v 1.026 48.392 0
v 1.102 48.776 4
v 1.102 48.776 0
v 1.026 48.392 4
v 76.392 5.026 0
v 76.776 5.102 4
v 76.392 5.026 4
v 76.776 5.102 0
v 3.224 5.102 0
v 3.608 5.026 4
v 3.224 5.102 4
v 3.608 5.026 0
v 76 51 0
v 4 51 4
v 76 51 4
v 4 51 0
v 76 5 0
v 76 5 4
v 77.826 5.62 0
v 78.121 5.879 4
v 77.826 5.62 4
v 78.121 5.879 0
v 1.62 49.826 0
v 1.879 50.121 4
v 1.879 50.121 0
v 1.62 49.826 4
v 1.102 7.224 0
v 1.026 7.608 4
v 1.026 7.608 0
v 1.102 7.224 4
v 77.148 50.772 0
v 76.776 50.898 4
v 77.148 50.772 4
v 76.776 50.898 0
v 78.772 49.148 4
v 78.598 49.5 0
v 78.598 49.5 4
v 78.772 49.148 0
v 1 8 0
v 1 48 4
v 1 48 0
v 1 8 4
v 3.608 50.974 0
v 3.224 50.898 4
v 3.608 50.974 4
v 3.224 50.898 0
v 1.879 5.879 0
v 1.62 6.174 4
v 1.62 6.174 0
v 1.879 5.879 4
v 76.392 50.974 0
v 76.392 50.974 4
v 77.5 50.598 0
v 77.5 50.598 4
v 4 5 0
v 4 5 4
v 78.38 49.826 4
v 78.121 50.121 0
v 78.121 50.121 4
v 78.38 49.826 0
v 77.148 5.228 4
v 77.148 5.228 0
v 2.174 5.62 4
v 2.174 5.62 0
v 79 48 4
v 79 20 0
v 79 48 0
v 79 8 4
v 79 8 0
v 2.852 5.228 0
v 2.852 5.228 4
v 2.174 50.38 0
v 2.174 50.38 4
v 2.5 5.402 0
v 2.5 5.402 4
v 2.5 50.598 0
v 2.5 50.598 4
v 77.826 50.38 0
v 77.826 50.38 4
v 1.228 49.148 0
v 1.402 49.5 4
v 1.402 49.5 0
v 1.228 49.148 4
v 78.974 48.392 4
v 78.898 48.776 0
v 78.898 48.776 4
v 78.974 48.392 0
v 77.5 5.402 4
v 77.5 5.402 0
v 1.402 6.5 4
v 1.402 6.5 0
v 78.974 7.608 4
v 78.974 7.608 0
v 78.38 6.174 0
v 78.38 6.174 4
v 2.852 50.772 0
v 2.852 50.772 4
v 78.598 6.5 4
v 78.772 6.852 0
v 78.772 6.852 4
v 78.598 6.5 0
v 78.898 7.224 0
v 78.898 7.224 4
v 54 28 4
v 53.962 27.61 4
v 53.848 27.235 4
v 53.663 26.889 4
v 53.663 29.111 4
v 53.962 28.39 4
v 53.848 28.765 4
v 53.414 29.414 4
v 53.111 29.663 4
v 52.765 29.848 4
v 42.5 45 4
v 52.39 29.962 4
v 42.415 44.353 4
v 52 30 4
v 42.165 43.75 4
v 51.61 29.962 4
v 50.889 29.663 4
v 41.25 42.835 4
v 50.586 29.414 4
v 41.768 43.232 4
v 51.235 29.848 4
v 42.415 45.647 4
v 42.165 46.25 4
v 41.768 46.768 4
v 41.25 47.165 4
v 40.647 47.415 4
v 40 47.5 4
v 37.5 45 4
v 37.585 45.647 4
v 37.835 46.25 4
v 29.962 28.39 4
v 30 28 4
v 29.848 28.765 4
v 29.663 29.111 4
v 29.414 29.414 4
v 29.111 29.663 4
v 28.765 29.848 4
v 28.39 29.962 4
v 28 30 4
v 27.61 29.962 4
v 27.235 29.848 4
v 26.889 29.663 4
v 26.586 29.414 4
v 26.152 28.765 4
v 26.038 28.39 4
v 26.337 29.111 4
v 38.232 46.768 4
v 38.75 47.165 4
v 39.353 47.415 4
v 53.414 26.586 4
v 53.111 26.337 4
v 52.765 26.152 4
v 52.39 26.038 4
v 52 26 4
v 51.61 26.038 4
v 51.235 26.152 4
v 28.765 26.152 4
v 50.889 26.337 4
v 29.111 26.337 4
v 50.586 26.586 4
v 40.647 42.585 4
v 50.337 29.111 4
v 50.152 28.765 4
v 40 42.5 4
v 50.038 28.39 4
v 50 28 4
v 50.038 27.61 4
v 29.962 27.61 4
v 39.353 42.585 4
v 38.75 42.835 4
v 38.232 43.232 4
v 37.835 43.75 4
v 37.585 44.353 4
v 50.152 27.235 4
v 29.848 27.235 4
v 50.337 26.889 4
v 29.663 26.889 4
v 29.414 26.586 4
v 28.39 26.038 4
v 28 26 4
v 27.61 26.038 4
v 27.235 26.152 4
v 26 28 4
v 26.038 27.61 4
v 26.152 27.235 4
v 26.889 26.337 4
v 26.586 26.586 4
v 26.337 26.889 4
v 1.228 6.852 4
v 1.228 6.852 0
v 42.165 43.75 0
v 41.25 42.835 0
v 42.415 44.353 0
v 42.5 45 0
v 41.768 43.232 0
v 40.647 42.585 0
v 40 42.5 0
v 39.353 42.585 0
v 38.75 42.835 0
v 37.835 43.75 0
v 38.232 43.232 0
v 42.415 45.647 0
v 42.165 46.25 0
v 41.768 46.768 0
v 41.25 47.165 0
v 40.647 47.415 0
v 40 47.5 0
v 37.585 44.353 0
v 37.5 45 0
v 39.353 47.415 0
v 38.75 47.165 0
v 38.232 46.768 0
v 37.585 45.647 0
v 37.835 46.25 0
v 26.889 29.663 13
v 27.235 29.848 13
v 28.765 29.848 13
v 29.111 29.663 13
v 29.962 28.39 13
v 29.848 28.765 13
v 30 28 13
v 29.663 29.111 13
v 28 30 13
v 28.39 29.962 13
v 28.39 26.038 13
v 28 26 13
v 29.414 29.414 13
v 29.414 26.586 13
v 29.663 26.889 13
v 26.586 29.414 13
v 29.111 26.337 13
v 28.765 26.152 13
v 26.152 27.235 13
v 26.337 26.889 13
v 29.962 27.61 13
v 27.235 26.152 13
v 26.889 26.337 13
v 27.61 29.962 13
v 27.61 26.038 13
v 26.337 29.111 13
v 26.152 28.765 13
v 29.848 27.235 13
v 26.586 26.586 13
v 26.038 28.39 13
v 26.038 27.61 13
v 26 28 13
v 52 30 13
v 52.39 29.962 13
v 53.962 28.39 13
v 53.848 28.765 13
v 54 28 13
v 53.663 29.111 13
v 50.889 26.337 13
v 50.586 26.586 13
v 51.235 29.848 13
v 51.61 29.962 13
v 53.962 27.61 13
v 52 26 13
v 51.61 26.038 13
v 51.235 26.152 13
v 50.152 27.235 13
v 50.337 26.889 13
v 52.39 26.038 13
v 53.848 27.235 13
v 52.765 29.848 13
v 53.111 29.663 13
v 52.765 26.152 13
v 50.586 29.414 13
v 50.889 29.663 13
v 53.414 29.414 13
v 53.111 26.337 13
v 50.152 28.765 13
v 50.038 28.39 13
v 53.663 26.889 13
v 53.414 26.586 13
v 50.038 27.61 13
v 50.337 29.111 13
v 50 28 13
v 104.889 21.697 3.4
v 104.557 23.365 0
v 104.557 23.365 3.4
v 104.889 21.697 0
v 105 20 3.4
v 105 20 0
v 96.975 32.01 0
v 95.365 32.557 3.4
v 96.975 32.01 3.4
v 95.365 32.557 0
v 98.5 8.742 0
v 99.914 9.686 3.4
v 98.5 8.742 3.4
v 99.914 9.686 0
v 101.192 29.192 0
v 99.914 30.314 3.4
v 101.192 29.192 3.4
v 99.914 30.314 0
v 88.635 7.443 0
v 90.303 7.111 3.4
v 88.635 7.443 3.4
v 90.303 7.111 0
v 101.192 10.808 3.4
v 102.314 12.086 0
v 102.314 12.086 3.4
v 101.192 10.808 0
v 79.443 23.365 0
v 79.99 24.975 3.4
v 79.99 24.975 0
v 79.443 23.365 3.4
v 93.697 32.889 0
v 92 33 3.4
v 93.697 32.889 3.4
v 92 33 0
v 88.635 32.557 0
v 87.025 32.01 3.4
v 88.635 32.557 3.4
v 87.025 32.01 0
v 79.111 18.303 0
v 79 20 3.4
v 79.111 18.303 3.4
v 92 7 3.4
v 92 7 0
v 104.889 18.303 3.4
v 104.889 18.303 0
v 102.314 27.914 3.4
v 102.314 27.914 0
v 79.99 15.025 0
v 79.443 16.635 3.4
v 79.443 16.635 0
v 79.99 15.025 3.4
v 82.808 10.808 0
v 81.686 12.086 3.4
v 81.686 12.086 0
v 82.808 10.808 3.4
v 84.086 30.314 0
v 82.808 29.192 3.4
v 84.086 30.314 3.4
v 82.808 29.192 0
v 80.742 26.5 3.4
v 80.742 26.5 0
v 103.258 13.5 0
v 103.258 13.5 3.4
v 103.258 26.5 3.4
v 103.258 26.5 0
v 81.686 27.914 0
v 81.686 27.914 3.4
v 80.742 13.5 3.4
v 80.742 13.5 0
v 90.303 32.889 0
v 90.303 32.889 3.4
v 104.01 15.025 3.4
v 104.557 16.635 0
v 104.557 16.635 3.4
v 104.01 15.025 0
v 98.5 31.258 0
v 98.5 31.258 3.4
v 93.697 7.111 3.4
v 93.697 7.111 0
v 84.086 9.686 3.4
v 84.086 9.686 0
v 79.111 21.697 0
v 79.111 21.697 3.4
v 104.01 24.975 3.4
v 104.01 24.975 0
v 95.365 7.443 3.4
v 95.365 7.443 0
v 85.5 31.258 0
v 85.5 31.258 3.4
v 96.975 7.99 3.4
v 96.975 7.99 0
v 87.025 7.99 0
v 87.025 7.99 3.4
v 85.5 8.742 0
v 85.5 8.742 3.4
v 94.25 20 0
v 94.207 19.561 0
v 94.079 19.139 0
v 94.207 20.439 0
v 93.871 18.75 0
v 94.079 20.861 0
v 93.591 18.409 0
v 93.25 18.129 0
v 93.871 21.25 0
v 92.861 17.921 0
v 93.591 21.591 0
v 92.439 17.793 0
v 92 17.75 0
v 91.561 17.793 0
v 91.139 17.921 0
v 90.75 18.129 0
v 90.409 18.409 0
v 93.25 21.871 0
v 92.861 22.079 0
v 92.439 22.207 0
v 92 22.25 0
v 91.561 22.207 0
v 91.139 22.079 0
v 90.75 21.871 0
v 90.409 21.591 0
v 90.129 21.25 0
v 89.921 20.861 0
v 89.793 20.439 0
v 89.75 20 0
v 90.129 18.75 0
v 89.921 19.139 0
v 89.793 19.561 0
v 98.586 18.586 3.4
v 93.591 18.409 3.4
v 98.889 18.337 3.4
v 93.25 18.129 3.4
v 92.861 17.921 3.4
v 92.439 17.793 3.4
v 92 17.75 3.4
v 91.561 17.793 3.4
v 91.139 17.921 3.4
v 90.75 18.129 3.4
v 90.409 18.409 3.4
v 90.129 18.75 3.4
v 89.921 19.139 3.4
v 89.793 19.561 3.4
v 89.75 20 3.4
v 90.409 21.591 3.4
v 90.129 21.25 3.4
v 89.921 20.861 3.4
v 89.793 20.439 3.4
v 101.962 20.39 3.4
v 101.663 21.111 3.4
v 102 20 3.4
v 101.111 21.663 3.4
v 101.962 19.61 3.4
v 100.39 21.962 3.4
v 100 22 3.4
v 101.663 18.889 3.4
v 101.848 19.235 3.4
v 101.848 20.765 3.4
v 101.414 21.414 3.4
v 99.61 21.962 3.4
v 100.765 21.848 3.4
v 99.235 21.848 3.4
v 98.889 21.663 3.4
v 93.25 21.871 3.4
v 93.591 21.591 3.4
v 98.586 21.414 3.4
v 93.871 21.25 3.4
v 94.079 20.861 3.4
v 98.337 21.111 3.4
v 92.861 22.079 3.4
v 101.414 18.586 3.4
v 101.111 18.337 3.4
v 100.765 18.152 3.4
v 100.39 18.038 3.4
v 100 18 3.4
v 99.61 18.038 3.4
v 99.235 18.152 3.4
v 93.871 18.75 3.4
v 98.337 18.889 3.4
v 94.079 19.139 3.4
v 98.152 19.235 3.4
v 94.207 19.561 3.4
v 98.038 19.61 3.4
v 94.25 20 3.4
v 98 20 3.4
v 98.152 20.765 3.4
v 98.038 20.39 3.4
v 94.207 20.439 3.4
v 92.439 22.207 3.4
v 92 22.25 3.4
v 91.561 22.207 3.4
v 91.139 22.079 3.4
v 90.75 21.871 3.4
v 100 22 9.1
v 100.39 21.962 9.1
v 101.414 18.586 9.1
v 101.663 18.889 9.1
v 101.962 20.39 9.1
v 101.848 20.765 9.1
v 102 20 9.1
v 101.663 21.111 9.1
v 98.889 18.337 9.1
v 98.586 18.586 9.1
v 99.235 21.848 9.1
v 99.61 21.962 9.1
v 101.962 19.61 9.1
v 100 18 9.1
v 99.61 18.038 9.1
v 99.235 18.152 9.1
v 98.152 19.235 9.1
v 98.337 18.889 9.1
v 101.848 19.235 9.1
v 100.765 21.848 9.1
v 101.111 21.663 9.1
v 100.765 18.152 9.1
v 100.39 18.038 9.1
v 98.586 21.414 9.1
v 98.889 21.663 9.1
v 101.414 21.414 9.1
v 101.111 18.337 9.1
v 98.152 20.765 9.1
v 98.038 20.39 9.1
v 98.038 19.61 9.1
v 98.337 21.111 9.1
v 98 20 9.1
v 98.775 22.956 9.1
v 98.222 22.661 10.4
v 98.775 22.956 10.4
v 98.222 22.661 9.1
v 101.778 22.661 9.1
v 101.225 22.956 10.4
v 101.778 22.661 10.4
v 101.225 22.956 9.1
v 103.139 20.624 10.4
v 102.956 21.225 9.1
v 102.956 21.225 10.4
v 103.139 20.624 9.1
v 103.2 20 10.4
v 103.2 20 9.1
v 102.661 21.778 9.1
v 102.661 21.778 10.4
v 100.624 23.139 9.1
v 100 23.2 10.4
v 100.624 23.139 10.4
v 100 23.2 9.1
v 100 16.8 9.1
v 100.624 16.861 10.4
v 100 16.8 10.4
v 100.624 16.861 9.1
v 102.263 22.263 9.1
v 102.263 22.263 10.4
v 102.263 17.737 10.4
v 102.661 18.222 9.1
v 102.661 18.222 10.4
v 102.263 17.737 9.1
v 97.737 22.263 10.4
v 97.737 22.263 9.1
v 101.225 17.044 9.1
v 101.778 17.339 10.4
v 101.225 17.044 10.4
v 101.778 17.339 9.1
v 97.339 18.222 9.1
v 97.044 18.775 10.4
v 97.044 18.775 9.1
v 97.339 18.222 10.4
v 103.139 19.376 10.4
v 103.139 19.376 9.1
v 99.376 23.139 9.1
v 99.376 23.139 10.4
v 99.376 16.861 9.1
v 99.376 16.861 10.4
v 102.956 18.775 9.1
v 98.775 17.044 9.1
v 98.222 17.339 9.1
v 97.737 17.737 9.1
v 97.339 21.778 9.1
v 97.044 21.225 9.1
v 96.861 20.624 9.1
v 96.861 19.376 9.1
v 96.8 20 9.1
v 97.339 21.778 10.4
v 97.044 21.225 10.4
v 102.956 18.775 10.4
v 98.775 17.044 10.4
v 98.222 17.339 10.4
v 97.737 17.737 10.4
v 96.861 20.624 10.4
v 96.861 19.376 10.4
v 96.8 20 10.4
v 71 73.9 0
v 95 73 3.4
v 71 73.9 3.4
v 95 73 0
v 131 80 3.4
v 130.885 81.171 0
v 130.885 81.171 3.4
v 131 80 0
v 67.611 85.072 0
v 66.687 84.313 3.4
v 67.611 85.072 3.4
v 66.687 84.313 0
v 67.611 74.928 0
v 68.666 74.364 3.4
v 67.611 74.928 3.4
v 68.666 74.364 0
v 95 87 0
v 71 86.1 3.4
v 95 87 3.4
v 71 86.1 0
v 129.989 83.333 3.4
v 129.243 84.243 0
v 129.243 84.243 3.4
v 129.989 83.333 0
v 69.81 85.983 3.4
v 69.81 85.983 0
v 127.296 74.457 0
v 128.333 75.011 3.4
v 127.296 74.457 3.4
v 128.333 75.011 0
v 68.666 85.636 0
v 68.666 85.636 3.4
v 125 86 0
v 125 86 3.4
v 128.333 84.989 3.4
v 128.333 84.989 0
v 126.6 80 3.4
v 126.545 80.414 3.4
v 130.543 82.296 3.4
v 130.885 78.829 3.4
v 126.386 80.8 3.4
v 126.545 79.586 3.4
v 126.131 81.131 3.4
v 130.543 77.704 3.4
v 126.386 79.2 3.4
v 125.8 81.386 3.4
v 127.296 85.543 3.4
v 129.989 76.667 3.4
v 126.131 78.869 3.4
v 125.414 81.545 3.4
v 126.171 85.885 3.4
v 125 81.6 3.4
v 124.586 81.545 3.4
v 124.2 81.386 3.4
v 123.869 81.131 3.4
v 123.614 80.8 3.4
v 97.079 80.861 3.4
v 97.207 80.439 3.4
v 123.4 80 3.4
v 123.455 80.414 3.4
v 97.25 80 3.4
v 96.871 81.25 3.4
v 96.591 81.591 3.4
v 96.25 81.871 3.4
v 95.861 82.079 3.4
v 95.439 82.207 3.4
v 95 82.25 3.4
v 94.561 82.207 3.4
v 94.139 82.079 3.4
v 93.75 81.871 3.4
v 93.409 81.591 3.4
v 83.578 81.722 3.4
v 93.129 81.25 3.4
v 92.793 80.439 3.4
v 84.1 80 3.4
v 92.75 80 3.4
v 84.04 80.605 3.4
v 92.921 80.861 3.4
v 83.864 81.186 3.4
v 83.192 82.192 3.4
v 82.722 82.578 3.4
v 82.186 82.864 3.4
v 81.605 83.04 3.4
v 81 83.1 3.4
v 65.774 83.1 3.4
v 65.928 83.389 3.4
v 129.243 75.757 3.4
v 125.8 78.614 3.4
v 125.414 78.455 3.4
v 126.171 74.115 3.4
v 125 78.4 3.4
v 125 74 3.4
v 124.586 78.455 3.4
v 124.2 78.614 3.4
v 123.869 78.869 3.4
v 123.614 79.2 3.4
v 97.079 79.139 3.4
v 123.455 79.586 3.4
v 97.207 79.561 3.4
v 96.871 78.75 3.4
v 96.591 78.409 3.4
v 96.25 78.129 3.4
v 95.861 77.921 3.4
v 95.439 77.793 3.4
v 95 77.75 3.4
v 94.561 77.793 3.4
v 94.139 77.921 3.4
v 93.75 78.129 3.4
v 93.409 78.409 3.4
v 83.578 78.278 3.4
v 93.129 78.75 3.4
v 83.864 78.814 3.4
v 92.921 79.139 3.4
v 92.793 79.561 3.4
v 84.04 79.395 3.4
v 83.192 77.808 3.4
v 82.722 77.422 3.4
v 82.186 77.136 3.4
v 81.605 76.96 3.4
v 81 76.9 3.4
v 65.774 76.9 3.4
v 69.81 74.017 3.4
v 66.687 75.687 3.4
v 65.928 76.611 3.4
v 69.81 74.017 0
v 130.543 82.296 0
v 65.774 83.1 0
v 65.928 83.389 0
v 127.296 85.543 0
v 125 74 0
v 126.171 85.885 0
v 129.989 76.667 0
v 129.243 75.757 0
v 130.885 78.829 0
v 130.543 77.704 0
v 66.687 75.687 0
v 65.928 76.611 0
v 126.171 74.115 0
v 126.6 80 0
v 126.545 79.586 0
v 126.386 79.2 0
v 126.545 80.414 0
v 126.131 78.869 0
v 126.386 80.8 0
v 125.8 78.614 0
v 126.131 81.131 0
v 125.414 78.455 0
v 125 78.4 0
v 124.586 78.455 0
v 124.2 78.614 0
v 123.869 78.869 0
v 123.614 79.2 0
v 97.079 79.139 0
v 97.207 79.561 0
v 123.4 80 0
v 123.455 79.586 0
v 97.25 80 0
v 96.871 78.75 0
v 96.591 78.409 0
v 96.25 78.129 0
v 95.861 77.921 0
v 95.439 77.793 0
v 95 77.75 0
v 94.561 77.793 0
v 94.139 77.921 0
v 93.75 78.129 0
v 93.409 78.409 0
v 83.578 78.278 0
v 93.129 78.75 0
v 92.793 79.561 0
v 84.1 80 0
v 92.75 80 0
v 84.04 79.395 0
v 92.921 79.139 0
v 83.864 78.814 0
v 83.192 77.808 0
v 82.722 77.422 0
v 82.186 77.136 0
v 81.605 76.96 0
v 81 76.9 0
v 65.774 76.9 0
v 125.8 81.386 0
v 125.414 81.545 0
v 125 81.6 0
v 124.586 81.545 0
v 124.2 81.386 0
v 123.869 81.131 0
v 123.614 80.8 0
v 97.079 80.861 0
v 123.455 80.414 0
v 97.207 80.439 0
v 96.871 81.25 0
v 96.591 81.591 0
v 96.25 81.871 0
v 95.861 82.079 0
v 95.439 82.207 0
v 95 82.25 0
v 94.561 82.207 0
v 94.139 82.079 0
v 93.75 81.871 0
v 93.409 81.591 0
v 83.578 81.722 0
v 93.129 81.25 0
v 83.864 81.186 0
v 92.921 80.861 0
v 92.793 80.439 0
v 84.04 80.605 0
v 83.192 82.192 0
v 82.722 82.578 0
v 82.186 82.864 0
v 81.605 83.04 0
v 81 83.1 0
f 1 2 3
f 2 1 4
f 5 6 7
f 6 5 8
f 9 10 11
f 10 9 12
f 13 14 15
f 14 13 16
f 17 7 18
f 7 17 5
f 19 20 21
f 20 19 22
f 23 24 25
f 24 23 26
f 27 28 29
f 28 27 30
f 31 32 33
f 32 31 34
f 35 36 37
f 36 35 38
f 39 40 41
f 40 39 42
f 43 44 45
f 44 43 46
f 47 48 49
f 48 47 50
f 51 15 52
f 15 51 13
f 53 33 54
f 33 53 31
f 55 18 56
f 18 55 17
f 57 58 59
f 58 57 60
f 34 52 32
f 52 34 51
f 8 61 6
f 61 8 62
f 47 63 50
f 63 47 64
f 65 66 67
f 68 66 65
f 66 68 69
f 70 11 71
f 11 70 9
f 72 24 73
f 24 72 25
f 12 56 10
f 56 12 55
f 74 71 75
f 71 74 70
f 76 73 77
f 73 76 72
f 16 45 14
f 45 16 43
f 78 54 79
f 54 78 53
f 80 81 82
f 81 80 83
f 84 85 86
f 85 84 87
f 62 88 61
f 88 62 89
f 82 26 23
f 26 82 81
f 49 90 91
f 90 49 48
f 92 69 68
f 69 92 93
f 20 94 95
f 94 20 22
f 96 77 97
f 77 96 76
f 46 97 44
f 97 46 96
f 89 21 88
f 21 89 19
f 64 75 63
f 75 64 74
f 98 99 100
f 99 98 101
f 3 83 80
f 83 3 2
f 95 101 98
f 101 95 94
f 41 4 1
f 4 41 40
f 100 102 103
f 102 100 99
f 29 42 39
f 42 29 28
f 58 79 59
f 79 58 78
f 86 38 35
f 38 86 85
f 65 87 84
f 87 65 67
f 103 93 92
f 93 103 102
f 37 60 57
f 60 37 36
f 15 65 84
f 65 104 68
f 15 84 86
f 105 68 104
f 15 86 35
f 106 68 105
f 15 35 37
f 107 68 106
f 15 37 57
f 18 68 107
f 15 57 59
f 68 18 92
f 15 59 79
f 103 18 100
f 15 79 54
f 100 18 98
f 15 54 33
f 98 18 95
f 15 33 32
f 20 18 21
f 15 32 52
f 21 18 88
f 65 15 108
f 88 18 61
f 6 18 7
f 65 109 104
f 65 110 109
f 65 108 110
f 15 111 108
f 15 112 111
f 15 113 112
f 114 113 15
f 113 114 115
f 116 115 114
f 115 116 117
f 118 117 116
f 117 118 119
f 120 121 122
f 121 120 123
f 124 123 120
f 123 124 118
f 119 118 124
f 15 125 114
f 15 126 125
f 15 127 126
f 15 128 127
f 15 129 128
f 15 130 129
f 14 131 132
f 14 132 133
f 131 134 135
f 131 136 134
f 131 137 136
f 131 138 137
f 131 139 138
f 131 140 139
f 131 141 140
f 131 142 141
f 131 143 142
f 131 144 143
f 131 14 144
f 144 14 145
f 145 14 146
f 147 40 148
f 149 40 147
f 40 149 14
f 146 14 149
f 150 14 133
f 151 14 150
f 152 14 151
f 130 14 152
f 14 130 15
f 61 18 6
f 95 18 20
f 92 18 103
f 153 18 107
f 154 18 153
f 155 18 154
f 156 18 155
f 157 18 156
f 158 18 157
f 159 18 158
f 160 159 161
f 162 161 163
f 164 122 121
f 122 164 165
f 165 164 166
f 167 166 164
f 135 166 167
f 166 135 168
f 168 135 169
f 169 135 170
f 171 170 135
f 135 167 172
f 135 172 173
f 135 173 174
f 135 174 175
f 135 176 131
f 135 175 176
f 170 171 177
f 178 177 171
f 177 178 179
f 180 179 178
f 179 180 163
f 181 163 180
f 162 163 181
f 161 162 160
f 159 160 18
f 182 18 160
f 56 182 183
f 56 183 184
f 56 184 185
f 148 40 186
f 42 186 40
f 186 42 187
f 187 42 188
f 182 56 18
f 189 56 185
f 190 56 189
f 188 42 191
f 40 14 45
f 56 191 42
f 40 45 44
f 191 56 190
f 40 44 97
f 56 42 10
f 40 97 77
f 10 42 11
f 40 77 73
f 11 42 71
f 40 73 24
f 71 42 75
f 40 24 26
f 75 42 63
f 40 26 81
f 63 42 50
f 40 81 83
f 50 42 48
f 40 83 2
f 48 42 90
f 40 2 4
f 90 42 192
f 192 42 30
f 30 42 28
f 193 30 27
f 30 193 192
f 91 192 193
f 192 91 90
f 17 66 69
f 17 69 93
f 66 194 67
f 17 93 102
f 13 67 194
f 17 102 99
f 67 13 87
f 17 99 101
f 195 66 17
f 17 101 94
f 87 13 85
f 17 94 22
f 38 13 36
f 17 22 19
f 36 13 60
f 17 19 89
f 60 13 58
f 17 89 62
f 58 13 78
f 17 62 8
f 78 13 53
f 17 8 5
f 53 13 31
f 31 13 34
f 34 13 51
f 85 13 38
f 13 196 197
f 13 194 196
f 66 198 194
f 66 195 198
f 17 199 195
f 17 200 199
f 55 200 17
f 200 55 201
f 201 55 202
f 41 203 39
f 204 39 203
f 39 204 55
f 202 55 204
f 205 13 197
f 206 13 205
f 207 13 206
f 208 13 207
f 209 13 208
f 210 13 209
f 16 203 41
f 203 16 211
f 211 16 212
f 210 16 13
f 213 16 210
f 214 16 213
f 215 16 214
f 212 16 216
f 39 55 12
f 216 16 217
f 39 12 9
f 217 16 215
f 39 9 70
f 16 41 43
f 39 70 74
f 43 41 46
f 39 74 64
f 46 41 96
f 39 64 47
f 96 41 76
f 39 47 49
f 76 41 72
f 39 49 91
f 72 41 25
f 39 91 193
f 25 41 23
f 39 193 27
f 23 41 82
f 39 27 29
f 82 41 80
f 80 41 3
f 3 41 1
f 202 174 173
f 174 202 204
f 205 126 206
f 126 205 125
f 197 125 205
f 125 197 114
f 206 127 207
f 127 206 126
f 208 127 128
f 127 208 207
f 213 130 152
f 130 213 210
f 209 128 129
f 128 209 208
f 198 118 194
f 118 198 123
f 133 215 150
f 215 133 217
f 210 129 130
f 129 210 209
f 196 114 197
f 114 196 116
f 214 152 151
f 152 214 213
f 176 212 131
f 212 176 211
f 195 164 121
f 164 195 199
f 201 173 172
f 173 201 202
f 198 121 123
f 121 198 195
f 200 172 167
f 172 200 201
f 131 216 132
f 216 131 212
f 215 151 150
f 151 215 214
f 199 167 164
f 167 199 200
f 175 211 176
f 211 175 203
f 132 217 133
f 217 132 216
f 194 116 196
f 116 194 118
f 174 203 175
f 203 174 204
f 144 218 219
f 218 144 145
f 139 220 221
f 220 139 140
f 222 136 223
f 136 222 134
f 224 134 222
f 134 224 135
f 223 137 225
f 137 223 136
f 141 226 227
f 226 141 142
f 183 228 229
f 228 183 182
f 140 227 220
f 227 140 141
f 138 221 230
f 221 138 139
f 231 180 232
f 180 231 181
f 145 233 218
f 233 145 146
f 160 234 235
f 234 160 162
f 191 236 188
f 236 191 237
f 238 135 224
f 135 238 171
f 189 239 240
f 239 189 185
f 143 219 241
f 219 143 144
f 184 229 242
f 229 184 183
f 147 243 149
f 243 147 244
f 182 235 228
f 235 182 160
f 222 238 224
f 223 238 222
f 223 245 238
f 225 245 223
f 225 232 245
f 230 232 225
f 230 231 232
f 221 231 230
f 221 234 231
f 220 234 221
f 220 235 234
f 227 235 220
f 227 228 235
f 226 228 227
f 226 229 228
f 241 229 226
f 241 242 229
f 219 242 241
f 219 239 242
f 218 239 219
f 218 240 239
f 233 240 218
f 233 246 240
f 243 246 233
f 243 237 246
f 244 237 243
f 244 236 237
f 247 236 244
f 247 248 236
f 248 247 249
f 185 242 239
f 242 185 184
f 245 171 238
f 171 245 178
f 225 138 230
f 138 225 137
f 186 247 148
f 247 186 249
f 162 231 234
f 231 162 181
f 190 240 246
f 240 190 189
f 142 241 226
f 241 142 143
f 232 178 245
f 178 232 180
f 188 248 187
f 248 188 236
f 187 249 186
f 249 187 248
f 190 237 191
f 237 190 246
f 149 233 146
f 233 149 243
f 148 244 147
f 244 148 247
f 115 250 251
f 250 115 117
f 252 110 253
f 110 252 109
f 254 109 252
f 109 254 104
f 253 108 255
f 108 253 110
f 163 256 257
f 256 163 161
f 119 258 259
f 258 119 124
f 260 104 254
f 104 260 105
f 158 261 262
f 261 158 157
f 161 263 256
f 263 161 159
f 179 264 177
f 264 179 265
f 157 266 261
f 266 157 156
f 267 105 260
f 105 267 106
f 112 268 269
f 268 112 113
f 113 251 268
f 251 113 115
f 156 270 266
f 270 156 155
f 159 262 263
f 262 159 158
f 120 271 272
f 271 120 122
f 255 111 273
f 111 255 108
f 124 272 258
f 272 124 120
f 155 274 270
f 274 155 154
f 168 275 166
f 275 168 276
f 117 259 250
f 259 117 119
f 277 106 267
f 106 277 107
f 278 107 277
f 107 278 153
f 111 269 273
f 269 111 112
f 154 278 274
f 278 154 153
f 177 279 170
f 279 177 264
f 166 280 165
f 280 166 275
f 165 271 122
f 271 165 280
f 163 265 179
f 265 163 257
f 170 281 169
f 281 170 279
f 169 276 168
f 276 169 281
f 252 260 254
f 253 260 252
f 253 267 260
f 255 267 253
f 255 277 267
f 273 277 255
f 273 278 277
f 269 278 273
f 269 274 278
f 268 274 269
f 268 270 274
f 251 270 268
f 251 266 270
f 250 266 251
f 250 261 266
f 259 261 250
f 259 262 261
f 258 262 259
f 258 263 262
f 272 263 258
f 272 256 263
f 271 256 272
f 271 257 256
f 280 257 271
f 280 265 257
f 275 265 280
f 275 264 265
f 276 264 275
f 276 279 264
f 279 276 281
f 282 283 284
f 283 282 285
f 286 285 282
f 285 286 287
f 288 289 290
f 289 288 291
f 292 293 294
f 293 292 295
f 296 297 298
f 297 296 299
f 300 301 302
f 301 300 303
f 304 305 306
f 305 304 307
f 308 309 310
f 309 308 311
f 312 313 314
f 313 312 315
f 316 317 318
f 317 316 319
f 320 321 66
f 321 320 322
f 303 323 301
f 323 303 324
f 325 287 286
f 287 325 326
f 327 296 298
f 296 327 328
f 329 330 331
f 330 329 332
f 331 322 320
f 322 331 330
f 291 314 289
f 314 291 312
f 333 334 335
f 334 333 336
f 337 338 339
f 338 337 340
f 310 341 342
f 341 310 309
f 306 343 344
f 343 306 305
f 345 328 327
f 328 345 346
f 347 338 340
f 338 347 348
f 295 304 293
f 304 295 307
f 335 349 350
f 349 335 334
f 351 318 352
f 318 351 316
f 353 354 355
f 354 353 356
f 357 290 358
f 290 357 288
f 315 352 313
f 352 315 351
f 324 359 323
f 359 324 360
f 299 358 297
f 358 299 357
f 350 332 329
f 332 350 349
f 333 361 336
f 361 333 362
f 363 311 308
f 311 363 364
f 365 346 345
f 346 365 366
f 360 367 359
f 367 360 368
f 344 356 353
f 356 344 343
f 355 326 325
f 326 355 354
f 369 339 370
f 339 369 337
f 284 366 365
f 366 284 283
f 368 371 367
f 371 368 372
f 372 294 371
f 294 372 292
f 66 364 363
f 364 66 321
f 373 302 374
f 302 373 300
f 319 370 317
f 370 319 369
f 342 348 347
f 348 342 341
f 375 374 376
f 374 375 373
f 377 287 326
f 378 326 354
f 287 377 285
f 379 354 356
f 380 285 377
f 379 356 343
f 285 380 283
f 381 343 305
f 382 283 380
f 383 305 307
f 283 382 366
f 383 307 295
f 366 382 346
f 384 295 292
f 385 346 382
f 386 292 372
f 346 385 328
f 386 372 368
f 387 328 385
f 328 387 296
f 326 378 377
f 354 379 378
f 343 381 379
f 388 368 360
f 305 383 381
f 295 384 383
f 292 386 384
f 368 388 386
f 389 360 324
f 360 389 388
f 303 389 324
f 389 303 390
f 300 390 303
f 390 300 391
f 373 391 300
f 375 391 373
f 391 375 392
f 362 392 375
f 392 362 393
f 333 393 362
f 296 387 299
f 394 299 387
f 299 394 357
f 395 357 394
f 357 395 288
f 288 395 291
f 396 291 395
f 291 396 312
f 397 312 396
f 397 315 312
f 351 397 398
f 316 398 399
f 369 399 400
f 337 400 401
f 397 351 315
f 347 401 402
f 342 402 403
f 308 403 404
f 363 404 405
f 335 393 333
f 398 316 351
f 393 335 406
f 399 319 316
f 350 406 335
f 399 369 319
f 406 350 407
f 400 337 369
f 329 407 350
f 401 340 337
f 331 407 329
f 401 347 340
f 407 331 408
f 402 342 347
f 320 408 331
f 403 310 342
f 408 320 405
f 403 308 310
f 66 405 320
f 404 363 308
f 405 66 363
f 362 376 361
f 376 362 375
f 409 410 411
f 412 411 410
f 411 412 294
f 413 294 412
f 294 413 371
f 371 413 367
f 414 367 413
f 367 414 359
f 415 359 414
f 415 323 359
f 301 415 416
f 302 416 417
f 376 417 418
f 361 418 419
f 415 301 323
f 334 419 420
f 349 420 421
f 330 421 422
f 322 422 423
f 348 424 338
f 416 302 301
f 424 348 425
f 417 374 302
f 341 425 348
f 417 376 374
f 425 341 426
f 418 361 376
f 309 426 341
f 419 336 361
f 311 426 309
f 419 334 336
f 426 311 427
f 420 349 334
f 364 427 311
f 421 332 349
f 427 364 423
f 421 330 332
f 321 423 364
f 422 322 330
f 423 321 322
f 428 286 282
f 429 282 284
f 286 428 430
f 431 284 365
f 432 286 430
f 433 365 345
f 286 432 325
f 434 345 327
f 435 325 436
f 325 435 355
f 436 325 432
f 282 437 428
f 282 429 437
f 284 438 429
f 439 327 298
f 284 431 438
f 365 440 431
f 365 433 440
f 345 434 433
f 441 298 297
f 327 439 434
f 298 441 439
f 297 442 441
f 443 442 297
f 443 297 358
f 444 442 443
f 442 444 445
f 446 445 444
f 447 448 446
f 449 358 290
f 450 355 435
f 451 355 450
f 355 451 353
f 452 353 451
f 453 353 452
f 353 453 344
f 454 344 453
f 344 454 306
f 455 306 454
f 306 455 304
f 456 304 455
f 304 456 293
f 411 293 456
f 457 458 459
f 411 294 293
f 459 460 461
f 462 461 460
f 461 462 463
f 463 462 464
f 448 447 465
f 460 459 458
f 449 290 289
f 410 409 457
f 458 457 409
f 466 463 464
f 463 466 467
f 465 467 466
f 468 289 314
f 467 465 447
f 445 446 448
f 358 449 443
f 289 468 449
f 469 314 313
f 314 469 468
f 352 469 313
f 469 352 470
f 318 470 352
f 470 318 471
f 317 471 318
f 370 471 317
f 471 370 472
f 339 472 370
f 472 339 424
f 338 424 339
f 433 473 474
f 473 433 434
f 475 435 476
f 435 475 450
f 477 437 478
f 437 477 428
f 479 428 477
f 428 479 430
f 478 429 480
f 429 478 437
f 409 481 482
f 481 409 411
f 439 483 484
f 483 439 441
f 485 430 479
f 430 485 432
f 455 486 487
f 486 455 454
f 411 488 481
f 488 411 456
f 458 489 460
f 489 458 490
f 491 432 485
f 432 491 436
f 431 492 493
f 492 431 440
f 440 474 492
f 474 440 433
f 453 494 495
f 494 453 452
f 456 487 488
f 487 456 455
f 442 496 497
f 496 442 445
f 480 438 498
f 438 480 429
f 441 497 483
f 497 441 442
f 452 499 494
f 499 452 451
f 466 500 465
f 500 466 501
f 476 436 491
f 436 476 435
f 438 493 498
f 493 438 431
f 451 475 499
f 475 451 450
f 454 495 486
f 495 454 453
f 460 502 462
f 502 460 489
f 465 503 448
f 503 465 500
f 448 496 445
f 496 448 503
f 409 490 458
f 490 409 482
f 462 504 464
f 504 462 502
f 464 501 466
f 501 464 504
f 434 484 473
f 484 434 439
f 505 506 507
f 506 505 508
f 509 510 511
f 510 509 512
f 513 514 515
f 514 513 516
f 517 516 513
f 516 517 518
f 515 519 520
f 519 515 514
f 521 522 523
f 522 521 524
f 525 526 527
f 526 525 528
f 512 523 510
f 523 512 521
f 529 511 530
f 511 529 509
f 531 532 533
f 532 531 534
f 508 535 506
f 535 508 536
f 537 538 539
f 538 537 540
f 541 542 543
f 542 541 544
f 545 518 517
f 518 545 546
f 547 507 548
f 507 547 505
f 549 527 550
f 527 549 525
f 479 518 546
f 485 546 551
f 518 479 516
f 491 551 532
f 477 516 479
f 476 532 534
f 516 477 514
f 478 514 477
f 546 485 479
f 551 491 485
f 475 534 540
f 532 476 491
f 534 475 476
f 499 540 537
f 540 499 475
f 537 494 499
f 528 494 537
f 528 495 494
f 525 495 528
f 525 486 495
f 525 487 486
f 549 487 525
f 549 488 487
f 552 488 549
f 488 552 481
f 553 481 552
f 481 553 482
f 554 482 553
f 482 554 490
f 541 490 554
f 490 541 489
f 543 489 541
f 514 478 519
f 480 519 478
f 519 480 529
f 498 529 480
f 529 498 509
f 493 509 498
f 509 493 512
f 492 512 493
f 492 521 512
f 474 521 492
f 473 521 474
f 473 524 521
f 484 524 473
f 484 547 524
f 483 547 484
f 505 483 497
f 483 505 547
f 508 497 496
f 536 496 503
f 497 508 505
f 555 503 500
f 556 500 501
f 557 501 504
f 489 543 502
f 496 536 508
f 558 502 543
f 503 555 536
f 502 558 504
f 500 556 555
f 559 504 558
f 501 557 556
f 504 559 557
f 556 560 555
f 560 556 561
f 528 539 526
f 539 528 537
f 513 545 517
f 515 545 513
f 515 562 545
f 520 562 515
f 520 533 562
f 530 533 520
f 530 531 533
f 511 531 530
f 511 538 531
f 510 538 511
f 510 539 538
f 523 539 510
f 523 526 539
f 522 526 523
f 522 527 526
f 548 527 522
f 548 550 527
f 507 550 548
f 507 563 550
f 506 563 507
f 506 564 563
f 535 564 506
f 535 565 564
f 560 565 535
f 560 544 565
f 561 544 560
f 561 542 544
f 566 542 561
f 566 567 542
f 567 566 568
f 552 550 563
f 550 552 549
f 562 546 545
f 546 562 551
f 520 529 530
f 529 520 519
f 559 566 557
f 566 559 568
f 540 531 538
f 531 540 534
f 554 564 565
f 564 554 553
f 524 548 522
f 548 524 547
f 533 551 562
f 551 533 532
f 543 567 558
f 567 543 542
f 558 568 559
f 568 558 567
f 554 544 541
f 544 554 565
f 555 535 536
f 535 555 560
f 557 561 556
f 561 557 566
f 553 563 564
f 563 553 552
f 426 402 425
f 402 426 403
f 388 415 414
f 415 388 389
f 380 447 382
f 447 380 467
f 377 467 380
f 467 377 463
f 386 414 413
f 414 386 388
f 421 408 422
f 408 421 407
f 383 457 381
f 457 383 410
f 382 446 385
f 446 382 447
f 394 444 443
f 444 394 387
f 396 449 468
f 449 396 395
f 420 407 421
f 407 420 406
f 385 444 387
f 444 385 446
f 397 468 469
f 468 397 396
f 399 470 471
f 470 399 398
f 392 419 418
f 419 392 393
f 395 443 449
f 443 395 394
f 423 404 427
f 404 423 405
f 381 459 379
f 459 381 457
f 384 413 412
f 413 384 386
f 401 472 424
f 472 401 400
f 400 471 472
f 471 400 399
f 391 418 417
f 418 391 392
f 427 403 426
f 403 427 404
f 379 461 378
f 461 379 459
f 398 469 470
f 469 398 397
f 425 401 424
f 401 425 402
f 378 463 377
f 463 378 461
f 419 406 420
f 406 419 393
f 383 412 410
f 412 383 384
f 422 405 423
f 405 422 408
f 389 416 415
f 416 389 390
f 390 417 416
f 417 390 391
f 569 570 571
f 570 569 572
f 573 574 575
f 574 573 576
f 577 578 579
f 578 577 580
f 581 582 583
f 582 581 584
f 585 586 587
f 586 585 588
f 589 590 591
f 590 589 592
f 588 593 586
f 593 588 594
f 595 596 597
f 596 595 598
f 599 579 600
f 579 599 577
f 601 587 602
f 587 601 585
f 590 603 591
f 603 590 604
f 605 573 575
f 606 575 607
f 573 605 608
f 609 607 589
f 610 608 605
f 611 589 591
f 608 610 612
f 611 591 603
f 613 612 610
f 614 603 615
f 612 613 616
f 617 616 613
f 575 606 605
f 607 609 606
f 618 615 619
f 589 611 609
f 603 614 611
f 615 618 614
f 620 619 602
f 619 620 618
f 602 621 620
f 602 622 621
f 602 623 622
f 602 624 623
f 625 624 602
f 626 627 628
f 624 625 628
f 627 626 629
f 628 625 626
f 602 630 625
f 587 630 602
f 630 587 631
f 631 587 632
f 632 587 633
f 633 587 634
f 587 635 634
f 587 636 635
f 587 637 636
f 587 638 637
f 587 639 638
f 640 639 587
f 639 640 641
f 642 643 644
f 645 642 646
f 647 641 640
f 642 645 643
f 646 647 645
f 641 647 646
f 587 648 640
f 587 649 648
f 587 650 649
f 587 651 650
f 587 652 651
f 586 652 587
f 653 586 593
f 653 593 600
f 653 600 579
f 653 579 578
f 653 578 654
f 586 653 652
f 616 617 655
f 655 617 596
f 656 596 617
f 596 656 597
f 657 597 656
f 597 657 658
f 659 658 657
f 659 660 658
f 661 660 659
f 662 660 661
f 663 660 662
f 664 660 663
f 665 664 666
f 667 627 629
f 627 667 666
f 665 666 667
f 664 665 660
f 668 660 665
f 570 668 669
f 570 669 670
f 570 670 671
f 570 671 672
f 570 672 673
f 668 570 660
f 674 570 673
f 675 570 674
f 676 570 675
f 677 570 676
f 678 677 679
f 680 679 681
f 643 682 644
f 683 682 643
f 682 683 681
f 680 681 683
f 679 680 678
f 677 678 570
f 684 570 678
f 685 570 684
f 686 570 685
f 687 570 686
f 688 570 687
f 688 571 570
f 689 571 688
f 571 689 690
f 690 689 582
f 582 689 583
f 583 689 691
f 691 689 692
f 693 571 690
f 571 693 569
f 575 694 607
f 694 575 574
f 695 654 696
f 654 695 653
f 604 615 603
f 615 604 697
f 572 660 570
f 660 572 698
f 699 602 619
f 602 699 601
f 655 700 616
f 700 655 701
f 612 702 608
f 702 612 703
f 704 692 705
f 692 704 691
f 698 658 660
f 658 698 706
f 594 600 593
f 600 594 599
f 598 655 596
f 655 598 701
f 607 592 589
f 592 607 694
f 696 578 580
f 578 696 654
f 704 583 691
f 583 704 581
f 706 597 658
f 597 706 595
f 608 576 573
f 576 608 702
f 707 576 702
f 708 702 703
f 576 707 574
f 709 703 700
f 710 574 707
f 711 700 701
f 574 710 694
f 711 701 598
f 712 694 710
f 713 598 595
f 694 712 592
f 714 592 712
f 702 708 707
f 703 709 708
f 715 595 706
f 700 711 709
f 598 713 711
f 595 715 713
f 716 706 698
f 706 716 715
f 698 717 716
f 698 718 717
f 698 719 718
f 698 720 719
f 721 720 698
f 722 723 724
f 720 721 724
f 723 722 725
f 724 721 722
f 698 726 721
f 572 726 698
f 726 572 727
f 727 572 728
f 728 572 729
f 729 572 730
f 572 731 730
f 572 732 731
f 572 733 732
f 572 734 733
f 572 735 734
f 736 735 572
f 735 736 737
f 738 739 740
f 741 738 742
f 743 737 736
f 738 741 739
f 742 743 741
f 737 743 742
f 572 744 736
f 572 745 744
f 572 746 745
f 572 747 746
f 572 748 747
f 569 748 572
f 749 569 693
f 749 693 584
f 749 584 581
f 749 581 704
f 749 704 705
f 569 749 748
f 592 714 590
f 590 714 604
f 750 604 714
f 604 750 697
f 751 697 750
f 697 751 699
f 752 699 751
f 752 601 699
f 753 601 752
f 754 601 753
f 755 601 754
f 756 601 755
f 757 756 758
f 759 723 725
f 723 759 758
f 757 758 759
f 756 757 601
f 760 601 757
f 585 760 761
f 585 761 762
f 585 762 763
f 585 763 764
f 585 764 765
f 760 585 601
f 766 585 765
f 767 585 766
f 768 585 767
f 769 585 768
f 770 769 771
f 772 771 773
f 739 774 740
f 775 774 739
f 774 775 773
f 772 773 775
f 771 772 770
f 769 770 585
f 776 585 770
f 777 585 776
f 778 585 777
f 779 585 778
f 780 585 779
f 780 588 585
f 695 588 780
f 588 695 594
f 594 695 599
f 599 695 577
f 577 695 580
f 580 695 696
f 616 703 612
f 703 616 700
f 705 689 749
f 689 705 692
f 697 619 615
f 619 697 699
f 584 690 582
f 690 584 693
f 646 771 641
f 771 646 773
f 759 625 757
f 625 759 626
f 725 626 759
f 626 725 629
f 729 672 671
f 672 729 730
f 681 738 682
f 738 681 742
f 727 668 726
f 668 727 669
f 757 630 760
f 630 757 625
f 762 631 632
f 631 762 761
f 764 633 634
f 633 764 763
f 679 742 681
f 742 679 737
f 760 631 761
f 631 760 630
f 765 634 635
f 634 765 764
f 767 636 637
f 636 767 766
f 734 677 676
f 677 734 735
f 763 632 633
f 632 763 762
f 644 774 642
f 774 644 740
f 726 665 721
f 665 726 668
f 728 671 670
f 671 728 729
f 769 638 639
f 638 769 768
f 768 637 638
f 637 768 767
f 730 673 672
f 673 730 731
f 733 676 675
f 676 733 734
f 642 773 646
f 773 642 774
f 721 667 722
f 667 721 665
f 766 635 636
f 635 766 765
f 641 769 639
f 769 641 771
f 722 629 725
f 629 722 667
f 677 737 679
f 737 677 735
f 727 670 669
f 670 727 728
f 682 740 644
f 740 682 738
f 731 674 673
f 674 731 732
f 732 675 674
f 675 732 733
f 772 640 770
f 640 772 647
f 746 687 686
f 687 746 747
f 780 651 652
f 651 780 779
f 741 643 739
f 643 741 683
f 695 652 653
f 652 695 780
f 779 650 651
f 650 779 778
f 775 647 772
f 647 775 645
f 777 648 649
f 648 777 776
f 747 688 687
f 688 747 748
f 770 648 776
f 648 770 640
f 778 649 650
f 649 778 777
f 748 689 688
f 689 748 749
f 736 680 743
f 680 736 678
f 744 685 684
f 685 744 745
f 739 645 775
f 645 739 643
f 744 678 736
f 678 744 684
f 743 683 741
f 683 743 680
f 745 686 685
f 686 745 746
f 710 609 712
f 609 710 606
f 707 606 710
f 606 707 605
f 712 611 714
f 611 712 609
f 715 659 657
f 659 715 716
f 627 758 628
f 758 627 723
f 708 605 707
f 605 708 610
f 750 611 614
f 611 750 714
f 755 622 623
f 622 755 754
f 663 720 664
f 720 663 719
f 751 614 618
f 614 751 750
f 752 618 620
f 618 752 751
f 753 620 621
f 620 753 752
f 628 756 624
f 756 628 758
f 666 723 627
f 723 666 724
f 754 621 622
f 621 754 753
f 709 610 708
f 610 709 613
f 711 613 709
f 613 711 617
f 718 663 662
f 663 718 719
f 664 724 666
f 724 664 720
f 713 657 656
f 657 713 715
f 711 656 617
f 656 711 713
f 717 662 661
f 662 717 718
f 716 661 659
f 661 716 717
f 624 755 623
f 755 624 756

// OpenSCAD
/*
Sample 136: Kurbel-Langloch-Schwinge — Kurbelradius 8 mm
Generated from the FDM Mechanical Sample Library.
Units: millimetres.

Override examples:
  openscad -o custom.stl -D 'view="plate"' -D 'render_fn=64' model.scad
  openscad -o preview.png -D 'view="assembly"' model.scad
*/
use <../../../library/fdm_mechanisms.scad>

render_fn = is_undef(render_fn) ? 48 : render_fn;
view = is_undef(view) ? "plate" : view;
$fn = render_fn;

sample_crank_rocker(
    view=view,
    crank_r=8,
    pivot_offset=24,
    slot_w=6.2,
    pin_d=4,
    rocker_r=30,
    plate_t=3.4
);
